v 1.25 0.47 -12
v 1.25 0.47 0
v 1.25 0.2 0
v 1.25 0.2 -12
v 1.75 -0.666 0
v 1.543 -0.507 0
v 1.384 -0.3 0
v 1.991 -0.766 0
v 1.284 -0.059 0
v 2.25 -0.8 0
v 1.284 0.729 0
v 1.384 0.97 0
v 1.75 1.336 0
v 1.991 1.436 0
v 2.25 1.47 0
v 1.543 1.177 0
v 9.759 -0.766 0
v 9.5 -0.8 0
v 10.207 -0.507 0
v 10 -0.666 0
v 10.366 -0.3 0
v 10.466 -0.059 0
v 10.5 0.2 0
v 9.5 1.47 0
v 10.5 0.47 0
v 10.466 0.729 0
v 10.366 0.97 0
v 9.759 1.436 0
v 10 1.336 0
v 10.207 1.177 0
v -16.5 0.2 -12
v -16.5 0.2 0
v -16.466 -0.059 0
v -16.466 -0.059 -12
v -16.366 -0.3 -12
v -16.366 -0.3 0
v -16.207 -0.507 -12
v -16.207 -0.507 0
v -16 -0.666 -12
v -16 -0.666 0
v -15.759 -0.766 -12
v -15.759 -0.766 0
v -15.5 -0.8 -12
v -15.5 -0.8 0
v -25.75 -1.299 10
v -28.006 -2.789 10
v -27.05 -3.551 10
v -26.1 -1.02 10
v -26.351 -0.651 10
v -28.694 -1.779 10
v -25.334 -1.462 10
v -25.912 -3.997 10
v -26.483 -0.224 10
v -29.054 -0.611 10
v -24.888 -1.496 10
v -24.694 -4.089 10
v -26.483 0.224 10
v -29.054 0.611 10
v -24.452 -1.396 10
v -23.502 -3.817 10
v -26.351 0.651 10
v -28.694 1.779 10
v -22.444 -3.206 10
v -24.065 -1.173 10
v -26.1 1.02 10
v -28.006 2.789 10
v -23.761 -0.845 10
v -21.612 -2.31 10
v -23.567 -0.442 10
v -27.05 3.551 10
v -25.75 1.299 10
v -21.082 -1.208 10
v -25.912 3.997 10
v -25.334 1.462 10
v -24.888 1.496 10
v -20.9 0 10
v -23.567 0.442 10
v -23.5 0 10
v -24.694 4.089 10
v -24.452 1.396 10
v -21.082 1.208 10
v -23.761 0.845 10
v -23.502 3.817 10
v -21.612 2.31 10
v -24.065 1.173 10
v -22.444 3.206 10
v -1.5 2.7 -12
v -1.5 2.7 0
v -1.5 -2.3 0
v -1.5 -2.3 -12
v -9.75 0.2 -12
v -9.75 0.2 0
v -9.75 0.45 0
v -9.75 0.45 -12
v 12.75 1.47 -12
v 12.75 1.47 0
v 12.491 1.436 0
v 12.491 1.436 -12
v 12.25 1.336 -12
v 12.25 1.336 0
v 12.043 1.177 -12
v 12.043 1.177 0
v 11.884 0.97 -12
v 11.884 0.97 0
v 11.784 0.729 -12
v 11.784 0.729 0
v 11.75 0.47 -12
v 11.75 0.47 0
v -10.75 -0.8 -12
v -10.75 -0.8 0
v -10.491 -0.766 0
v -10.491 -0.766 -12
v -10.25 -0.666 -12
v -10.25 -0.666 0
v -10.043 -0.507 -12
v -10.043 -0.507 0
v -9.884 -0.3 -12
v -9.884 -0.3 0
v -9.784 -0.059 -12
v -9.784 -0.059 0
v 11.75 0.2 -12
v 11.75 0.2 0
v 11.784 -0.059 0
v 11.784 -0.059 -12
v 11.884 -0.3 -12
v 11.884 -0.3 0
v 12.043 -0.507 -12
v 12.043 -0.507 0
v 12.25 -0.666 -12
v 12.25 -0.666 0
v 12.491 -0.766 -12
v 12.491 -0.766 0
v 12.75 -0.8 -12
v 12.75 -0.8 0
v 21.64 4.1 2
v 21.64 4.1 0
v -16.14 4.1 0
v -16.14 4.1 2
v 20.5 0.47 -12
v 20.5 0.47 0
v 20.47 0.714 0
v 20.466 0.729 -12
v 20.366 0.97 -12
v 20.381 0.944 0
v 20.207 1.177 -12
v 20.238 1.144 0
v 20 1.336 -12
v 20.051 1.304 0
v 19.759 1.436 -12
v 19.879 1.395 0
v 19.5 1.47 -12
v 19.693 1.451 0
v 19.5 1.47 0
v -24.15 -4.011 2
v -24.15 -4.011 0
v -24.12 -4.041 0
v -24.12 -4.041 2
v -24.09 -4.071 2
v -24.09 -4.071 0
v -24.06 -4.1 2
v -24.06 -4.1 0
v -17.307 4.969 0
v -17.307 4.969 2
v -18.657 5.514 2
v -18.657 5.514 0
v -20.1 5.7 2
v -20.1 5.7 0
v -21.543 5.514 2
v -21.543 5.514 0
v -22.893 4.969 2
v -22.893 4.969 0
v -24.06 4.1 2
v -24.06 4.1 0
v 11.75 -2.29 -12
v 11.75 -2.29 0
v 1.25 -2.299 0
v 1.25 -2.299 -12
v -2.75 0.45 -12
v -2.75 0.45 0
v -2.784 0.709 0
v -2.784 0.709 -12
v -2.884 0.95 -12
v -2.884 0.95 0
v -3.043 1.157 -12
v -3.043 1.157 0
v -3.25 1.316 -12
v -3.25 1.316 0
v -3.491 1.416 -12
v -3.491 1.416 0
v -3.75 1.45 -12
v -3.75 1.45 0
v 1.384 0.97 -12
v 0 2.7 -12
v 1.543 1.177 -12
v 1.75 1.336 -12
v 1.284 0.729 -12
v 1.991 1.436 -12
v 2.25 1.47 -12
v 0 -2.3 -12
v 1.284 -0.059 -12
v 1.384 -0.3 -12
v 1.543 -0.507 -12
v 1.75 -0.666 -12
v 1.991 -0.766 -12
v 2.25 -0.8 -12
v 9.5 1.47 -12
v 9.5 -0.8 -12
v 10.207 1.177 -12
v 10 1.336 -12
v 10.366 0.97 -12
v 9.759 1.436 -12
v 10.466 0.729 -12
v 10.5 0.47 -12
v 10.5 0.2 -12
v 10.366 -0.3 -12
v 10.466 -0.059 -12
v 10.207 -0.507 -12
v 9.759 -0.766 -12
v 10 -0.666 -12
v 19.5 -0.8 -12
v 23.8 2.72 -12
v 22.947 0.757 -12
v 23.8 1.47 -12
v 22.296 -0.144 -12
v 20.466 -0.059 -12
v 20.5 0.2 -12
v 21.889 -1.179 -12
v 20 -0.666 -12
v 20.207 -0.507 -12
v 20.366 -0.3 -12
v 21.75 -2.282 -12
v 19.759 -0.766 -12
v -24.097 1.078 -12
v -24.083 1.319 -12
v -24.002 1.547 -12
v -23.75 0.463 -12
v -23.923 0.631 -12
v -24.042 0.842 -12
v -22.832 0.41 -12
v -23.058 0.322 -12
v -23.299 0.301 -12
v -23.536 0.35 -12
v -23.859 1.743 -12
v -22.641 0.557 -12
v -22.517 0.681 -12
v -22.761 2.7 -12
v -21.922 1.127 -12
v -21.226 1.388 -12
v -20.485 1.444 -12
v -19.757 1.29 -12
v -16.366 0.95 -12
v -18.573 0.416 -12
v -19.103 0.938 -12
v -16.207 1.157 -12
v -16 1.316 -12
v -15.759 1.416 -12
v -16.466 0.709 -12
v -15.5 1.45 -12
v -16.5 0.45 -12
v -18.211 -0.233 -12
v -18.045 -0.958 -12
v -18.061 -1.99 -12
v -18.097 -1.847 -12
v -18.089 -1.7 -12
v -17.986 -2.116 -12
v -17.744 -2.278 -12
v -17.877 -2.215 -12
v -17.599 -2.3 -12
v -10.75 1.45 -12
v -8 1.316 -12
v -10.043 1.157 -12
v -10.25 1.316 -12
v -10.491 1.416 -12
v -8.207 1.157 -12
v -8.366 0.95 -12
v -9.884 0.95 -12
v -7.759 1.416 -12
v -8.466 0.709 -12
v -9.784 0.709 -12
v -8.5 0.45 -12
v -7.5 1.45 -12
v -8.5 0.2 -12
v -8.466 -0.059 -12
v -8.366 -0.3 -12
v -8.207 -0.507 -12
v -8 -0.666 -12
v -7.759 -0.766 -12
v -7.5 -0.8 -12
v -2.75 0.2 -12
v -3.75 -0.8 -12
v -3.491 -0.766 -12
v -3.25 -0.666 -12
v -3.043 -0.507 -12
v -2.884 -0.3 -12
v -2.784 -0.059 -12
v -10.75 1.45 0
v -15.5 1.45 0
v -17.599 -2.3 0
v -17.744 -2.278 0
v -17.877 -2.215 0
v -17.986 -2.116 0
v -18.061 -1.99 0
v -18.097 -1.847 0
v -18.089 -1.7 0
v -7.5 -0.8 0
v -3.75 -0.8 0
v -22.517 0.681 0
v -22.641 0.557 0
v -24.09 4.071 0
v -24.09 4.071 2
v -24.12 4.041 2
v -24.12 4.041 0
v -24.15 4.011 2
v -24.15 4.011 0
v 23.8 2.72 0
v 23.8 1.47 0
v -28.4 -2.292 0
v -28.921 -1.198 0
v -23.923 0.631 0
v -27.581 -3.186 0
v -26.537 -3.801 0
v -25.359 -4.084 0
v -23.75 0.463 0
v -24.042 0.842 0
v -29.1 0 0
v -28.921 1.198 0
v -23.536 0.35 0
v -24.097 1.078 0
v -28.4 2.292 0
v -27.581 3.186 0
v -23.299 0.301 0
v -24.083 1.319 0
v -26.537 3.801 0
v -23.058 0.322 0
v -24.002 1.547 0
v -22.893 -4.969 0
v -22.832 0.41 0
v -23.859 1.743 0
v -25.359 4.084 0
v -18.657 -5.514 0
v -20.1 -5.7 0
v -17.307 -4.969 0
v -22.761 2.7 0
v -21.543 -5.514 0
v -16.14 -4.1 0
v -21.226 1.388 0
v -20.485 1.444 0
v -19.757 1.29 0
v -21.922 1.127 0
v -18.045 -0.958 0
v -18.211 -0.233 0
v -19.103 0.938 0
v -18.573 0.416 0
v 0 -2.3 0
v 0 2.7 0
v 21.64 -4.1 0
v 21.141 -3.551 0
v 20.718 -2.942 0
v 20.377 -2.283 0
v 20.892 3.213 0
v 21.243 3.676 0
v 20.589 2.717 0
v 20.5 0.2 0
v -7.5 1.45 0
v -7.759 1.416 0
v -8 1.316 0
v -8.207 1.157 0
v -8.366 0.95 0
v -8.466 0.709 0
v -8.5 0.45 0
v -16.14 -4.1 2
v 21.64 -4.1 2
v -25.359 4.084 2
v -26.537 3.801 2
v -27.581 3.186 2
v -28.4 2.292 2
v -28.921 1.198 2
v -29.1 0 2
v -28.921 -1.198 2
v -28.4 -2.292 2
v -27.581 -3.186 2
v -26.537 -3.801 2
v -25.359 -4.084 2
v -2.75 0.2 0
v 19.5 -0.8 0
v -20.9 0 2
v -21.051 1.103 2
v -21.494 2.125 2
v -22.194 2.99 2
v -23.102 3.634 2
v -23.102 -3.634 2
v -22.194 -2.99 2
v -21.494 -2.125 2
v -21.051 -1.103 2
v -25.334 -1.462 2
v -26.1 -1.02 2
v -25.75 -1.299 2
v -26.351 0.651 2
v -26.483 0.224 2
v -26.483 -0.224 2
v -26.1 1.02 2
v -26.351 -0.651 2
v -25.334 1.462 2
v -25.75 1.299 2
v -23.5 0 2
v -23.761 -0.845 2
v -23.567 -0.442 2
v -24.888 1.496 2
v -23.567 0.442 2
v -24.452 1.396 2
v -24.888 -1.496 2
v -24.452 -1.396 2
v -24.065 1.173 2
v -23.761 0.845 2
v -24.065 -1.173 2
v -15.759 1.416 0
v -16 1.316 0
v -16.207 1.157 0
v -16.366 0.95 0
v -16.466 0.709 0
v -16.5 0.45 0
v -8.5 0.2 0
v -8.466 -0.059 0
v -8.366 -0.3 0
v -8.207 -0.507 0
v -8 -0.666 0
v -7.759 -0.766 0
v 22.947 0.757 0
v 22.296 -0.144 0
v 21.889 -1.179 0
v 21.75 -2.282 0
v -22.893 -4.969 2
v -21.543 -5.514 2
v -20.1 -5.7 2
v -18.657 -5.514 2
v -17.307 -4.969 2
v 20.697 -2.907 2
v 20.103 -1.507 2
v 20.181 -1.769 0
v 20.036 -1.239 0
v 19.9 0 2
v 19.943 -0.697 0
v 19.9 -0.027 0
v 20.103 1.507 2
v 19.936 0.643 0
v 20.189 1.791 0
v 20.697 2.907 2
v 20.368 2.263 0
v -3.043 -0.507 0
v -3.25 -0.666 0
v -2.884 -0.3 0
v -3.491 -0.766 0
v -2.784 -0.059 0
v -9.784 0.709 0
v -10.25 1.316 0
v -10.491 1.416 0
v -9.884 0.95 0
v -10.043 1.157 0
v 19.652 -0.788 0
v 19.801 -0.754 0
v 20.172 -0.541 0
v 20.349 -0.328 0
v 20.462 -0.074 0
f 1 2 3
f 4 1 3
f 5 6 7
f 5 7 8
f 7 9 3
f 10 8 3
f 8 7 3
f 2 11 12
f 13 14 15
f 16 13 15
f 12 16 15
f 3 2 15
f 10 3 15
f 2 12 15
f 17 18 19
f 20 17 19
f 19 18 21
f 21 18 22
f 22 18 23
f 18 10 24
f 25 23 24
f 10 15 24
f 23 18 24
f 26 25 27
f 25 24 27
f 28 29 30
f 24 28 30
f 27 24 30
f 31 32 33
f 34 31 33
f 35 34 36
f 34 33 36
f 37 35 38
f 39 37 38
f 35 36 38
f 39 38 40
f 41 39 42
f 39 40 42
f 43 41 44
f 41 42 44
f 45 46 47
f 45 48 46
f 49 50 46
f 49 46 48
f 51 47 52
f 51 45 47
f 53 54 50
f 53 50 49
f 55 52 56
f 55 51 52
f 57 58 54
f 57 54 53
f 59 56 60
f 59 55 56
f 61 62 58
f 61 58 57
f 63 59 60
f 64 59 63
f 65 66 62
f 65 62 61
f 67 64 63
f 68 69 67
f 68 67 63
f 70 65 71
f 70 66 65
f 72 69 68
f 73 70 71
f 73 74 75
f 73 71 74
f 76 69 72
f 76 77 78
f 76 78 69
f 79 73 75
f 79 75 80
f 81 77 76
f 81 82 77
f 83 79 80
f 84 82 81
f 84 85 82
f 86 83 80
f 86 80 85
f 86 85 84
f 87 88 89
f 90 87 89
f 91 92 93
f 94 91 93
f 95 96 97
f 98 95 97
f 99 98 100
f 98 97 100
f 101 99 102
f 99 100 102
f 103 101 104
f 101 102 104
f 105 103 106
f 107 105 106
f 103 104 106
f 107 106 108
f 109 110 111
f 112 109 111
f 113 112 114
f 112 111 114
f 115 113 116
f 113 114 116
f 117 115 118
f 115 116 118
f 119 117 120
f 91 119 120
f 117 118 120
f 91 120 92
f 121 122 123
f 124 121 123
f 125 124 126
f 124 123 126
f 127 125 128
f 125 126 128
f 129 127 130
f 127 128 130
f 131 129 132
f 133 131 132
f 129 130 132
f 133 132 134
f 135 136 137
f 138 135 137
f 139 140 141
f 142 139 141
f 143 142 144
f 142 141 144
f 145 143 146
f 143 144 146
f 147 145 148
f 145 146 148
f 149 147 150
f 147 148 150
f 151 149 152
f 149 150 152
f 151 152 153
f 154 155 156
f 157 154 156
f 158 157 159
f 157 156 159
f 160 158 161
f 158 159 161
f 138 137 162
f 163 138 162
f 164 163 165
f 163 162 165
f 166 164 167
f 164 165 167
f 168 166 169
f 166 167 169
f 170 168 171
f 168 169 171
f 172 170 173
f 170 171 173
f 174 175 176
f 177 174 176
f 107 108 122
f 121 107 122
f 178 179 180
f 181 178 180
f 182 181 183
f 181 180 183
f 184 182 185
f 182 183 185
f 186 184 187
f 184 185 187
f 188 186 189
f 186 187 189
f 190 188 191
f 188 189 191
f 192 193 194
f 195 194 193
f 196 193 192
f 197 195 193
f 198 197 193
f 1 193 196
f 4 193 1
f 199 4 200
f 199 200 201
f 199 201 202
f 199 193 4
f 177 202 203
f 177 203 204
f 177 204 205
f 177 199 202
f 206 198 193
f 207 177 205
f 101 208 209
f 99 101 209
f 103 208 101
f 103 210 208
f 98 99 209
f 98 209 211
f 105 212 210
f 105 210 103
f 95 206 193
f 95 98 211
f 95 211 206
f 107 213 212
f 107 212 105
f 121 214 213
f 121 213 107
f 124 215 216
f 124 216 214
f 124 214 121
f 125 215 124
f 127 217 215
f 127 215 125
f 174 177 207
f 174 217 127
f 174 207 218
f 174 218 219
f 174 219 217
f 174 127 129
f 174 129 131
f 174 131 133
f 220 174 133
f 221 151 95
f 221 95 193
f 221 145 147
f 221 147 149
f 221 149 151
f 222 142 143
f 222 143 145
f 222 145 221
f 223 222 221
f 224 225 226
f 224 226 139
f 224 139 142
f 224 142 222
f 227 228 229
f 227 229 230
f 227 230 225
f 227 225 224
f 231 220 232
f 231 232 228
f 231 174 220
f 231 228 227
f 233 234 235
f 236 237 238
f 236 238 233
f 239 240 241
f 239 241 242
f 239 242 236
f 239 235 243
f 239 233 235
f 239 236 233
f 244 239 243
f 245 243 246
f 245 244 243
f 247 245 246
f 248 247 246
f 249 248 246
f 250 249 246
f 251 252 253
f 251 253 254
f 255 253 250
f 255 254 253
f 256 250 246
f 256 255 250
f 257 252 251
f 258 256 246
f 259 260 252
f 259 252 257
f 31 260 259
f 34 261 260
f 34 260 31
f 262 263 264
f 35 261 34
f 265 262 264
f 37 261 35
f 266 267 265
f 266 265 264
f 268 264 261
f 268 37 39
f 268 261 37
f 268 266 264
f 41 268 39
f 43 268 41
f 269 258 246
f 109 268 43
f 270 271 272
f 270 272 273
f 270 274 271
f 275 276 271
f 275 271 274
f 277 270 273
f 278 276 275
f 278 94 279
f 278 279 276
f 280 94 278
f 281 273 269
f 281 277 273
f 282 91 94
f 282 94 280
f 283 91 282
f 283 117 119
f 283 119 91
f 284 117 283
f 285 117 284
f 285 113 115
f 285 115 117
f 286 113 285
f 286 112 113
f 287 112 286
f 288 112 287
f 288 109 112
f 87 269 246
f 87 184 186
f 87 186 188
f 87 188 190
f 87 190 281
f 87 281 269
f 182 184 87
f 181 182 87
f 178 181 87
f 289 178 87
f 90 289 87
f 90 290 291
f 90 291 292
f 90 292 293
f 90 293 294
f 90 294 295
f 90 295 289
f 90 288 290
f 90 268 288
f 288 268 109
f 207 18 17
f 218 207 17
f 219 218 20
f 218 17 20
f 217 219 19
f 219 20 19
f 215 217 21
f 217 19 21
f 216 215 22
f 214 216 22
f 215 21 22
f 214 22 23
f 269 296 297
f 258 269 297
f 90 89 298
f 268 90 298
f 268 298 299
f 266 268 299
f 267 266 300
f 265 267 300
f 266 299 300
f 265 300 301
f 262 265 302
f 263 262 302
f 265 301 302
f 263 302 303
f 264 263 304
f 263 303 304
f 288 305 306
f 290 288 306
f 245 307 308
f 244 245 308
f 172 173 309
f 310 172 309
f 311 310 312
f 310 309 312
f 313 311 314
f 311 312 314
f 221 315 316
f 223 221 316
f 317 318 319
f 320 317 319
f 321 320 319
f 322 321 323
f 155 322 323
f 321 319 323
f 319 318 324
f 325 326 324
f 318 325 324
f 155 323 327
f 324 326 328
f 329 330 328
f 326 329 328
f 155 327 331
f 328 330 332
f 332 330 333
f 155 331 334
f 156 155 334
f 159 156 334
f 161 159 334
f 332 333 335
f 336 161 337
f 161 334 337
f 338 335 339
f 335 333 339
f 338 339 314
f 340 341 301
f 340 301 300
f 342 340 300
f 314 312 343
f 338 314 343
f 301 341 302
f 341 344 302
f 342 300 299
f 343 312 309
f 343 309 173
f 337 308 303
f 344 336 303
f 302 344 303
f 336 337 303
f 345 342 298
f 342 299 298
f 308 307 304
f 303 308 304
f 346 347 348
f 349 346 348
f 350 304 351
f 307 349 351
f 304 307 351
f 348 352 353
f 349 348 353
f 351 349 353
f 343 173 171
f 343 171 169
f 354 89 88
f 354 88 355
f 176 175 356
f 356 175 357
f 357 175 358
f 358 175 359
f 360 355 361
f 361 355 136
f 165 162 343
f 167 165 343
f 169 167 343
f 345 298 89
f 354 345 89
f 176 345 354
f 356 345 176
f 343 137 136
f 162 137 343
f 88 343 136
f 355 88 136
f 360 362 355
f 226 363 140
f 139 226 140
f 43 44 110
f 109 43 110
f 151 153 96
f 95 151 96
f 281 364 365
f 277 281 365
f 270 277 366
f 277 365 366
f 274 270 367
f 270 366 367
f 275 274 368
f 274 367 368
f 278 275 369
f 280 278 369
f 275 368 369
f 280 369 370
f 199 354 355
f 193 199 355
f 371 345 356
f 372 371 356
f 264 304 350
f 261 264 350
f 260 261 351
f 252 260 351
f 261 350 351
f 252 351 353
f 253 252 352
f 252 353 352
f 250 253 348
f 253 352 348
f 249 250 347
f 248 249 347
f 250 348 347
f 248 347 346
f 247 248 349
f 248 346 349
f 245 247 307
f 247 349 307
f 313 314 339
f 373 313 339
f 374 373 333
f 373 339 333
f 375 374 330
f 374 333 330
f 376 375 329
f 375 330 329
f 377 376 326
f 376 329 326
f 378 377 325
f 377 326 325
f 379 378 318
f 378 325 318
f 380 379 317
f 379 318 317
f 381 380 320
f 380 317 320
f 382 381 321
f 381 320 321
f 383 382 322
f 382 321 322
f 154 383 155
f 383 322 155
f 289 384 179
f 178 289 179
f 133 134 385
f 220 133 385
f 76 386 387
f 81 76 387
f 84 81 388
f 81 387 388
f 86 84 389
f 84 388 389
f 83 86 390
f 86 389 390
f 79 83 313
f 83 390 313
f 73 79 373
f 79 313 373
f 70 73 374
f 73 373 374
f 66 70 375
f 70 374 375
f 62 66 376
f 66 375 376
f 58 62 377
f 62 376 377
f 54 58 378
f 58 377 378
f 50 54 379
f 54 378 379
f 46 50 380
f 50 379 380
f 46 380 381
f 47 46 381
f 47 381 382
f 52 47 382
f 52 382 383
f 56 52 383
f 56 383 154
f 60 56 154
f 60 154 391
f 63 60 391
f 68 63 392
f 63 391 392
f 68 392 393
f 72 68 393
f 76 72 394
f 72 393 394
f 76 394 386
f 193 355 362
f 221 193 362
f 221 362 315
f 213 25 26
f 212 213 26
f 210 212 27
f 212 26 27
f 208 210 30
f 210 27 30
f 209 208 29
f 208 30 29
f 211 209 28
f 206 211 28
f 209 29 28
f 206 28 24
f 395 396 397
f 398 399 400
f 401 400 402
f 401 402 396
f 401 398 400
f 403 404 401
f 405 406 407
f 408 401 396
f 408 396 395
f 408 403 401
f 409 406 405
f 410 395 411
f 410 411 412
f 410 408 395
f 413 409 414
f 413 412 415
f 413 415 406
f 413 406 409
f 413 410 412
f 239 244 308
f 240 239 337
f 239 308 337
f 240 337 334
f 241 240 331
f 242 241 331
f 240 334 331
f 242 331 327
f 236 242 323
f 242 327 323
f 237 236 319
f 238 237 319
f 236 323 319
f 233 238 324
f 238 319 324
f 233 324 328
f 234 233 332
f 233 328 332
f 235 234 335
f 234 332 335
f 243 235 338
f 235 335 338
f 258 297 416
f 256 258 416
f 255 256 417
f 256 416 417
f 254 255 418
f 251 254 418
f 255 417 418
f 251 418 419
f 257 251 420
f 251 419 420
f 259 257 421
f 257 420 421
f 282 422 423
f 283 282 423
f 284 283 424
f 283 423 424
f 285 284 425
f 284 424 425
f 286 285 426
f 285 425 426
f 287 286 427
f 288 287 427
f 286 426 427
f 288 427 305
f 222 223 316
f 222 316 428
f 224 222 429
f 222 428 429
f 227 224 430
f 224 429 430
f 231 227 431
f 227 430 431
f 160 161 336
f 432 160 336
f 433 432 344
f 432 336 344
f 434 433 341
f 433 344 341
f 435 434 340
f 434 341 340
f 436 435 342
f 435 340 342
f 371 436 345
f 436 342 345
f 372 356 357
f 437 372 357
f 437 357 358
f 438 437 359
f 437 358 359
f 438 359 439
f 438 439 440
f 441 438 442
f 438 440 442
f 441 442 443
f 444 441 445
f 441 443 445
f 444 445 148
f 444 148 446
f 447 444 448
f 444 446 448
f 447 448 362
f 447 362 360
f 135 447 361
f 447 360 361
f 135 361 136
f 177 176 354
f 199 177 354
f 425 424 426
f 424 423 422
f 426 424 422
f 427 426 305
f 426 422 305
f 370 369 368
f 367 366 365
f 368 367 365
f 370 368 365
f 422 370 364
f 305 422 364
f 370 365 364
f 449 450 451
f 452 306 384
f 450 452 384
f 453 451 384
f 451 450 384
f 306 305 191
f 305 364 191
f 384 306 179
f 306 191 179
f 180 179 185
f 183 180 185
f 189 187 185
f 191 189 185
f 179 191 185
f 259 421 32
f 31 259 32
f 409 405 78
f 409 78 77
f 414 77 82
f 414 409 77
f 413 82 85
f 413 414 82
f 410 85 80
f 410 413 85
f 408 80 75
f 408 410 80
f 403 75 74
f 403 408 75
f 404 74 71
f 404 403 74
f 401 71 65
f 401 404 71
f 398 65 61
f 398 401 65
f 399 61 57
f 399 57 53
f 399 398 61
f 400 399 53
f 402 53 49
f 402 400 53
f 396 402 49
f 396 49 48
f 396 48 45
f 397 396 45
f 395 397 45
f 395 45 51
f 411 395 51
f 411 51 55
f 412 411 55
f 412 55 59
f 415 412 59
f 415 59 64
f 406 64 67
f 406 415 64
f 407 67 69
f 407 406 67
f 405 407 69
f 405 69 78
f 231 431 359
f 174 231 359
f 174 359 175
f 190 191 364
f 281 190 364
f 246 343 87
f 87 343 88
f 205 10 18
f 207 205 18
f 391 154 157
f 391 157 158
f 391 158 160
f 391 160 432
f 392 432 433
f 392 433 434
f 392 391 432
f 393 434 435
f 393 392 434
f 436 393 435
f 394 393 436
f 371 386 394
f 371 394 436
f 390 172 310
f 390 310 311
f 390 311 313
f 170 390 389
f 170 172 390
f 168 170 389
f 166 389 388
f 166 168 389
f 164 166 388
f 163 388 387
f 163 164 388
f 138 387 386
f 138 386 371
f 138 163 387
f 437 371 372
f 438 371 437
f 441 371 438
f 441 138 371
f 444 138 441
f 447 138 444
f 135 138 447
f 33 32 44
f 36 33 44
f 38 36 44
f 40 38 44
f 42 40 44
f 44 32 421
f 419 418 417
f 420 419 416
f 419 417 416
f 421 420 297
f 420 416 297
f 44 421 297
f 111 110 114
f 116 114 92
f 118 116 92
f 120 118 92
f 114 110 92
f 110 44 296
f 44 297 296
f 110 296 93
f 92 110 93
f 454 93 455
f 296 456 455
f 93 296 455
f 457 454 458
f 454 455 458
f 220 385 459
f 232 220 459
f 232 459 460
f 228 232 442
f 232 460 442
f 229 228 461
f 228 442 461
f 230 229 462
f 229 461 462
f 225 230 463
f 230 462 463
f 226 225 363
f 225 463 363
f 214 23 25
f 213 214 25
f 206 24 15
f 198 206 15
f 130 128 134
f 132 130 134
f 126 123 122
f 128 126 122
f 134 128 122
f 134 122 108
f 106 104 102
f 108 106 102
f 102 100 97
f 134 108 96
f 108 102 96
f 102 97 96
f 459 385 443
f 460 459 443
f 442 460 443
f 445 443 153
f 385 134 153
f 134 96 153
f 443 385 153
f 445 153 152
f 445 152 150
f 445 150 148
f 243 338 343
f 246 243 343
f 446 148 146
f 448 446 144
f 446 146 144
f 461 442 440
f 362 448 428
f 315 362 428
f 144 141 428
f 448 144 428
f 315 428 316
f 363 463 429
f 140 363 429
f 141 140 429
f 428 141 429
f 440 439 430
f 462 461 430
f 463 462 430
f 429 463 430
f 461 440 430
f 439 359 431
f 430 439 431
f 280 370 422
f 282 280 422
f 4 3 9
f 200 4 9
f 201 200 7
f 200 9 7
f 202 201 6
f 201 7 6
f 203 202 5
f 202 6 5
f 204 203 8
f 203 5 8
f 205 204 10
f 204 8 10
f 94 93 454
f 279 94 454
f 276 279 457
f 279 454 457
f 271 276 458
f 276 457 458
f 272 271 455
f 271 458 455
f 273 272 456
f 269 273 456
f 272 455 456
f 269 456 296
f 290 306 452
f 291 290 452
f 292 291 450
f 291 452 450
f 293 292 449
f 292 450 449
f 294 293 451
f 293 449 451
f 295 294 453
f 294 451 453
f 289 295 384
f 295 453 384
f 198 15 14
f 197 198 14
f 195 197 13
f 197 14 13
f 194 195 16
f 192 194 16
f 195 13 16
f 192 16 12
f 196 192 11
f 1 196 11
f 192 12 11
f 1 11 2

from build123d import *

# Parameters (mm, degrees)
F1_DEPTH = 2
F2_R     = 4.1
F2_R_2   = 1.5
F3_DEPTH = 8
F5_DEPTH = 12


with BuildPart() as f1:
    # F0 (on Top) → F1 (new body)
    with BuildSketch(Plane.XY):
        with BuildLine():
            ThreePointArc((-16.1402020254, 4.1), (-20.1, 5.7), (-24.0597979746, 4.1))
            Line((-24.0597979746, 4.1), (-16.1402020254, 4.1))
        make_face()
        with BuildLine():
            Line((-16.1402020254, 4.1), (-24.0597979746, 4.1))
            ThreePointArc((-24.0597979746, 4.1), (-24.1051466384, 4.0557120713), (-24.15, 4.0109225871))
            ThreePointArc((-24.15, 4.0109225871), (-29.1, 0), (-24.15, -4.0109225871))
            ThreePointArc((-24.15, -4.0109225871), (-24.1051466384, -4.0557120713), (-24.0597979746, -4.1))
            Line((-24.0597979746, -4.1), (-16.1402020254, -4.1))
            Line((-16.1402020254, -4.1), (21.6402020254, -4.1))
            ThreePointArc((21.6402020254, -4.1), (19.9, 0), (21.6402020254, 4.1))
            Line((21.6402020254, 4.1), (-16.1402020254, 4.1))
        make_face()
        with BuildLine():
            Line((-16.1402020254, -4.1), (-24.0597979746, -4.1))
            ThreePointArc((-24.0597979746, -4.1), (-20.1, -5.7), (-16.1402020254, -4.1))
        make_face()
    extrude(amount=F1_DEPTH)

    # F2 (on face) → F3 (join)
    with BuildSketch(Plane.XY.offset(2)):
        with Locations((-25, 0)):
            Circle(F2_R)
        with Locations((-25, 0)):
            Circle(F2_R_2, mode=Mode.SUBTRACT)
    extrude(amount=F3_DEPTH)

    # F4 (on face) → F5 (join)
    with BuildSketch(Plane(origin=(0, 0, 0), x_dir=(1, 0, 0), z_dir=(0, 0, -1))):
        with BuildLine():
            Line((-23.8593048022, -1.7426615038), (-22.7605585052, -2.7))
            Line((-22.7605585052, -2.7), (-1.5, -2.7))
            Line((-1.5, -2.7), (-1.5, 2.3))
            Line((-1.5, 2.3), (-17.5988609143, 2.3))
            ThreePointArc((-17.5988609143, 2.3), (-17.986159249, 2.116227766), (-18.0887588629, 1.7))
            ThreePointArc((-18.0887588629, 1.7), (-19.4175132364, -1.1369373376), (-22.5168783934, -0.6811553006))
            Line((-22.5168783934, -0.6811553006), (-22.6406951978, -0.5573384962))
            ThreePointArc((-22.6406951978, -0.5573384962), (-23.8426615038, -0.5406951978), (-23.8593048022, -1.7426615038))
        make_face()
        with BuildLine():
            ThreePointArc((-15.5, -1.45), (-16.2071067812, -1.1571067812), (-16.5, -0.45))
            Line((-16.5, -0.45), (-16.5, -0.2))
            ThreePointArc((-16.5, -0.2), (-16.2071067812, 0.5071067812), (-15.5, 0.8))
            Line((-15.5, 0.8), (-10.75, 0.8))
            ThreePointArc((-10.75, 0.8), (-10.0428932188, 0.5071067812), (-9.75, -0.2))
            Line((-9.75, -0.2), (-9.75, -0.45))
            ThreePointArc((-9.75, -0.45), (-10.0428932188, -1.1571067812), (-10.75, -1.45))
            Line((-10.75, -1.45), (-15.5, -1.45))
        make_face(mode=Mode.SUBTRACT)
        with BuildLine():
            Line((-2.75, -0.2), (-2.75, -0.45))
            ThreePointArc((-2.75, -0.45), (-3.0428932188, -1.1571067812), (-3.75, -1.45))
            Line((-3.75, -1.45), (-7.5, -1.45))
            ThreePointArc((-7.5, -1.45), (-8.2071067812, -1.1571067812), (-8.5, -0.45))
            Line((-8.5, -0.45), (-8.5, -0.2))
            ThreePointArc((-8.5, -0.2), (-8.2071067812, 0.5071067812), (-7.5, 0.8))
            Line((-7.5, 0.8), (-3.75, 0.8))
            ThreePointArc((-3.75, 0.8), (-3.0428932188, 0.5071067812), (-2.75, -0.2))
        make_face(mode=Mode.SUBTRACT)
        with BuildLine():
            Line((0, 2.3), (0, -2.7))
            Line((0, -2.7), (23.7999915966, -2.72))
            Line((23.7999915966, -2.72), (23.7999915966, -1.47))
            ThreePointArc((23.7999915966, -1.47), (22.2959243854, 0.1440913013), (21.75, 2.281724448))
            Line((21.75, 2.281724448), (11.7499999993, 2.2901270007))
            Line((11.7499999993, 2.2901270007), (1.25, 2.2989496809))
            Line((1.25, 2.2989496809), (0, 2.3))
        make_face()
        with BuildLine():
            ThreePointArc((2.25, -1.47), (1.5428932188, -1.1771067812), (1.25, -0.47))
            Line((1.25, -0.47), (1.25, -0.2))
            ThreePointArc((1.25, -0.2), (1.5428932188, 0.5071067812), (2.25, 0.8))
            Line((2.25, 0.8), (9.5, 0.8))
            ThreePointArc((9.5, 0.8), (10.2071067812, 0.5071067812), (10.5, -0.2))
            Line((10.5, -0.2), (10.5, -0.47))
            ThreePointArc((10.5, -0.47), (10.2071067812, -1.1771067812), (9.5, -1.47))
            Line((9.5, -1.47), (2.25, -1.47))
        make_face(mode=Mode.SUBTRACT)
        with BuildLine():
            ThreePointArc((12.75, -1.47), (12.0428932188, -1.1771067812), (11.75, -0.47))
            Line((11.75, -0.47), (11.75, -0.2))
            ThreePointArc((11.75, -0.2), (12.0428932188, 0.5071067812), (12.75, 0.8))
            Line((12.75, 0.8), (19.5, 0.8))
            ThreePointArc((19.5, 0.8), (20.2071067812, 0.5071067812), (20.5, -0.2))
            Line((20.5, -0.2), (20.5, -0.47))
            ThreePointArc((20.5, -0.47), (20.2071067812, -1.1771067812), (19.5, -1.47))
            Line((19.5, -1.47), (12.75, -1.47))
        make_face(mode=Mode.SUBTRACT)
    extrude(amount=F5_DEPTH)


solid = f1.part
